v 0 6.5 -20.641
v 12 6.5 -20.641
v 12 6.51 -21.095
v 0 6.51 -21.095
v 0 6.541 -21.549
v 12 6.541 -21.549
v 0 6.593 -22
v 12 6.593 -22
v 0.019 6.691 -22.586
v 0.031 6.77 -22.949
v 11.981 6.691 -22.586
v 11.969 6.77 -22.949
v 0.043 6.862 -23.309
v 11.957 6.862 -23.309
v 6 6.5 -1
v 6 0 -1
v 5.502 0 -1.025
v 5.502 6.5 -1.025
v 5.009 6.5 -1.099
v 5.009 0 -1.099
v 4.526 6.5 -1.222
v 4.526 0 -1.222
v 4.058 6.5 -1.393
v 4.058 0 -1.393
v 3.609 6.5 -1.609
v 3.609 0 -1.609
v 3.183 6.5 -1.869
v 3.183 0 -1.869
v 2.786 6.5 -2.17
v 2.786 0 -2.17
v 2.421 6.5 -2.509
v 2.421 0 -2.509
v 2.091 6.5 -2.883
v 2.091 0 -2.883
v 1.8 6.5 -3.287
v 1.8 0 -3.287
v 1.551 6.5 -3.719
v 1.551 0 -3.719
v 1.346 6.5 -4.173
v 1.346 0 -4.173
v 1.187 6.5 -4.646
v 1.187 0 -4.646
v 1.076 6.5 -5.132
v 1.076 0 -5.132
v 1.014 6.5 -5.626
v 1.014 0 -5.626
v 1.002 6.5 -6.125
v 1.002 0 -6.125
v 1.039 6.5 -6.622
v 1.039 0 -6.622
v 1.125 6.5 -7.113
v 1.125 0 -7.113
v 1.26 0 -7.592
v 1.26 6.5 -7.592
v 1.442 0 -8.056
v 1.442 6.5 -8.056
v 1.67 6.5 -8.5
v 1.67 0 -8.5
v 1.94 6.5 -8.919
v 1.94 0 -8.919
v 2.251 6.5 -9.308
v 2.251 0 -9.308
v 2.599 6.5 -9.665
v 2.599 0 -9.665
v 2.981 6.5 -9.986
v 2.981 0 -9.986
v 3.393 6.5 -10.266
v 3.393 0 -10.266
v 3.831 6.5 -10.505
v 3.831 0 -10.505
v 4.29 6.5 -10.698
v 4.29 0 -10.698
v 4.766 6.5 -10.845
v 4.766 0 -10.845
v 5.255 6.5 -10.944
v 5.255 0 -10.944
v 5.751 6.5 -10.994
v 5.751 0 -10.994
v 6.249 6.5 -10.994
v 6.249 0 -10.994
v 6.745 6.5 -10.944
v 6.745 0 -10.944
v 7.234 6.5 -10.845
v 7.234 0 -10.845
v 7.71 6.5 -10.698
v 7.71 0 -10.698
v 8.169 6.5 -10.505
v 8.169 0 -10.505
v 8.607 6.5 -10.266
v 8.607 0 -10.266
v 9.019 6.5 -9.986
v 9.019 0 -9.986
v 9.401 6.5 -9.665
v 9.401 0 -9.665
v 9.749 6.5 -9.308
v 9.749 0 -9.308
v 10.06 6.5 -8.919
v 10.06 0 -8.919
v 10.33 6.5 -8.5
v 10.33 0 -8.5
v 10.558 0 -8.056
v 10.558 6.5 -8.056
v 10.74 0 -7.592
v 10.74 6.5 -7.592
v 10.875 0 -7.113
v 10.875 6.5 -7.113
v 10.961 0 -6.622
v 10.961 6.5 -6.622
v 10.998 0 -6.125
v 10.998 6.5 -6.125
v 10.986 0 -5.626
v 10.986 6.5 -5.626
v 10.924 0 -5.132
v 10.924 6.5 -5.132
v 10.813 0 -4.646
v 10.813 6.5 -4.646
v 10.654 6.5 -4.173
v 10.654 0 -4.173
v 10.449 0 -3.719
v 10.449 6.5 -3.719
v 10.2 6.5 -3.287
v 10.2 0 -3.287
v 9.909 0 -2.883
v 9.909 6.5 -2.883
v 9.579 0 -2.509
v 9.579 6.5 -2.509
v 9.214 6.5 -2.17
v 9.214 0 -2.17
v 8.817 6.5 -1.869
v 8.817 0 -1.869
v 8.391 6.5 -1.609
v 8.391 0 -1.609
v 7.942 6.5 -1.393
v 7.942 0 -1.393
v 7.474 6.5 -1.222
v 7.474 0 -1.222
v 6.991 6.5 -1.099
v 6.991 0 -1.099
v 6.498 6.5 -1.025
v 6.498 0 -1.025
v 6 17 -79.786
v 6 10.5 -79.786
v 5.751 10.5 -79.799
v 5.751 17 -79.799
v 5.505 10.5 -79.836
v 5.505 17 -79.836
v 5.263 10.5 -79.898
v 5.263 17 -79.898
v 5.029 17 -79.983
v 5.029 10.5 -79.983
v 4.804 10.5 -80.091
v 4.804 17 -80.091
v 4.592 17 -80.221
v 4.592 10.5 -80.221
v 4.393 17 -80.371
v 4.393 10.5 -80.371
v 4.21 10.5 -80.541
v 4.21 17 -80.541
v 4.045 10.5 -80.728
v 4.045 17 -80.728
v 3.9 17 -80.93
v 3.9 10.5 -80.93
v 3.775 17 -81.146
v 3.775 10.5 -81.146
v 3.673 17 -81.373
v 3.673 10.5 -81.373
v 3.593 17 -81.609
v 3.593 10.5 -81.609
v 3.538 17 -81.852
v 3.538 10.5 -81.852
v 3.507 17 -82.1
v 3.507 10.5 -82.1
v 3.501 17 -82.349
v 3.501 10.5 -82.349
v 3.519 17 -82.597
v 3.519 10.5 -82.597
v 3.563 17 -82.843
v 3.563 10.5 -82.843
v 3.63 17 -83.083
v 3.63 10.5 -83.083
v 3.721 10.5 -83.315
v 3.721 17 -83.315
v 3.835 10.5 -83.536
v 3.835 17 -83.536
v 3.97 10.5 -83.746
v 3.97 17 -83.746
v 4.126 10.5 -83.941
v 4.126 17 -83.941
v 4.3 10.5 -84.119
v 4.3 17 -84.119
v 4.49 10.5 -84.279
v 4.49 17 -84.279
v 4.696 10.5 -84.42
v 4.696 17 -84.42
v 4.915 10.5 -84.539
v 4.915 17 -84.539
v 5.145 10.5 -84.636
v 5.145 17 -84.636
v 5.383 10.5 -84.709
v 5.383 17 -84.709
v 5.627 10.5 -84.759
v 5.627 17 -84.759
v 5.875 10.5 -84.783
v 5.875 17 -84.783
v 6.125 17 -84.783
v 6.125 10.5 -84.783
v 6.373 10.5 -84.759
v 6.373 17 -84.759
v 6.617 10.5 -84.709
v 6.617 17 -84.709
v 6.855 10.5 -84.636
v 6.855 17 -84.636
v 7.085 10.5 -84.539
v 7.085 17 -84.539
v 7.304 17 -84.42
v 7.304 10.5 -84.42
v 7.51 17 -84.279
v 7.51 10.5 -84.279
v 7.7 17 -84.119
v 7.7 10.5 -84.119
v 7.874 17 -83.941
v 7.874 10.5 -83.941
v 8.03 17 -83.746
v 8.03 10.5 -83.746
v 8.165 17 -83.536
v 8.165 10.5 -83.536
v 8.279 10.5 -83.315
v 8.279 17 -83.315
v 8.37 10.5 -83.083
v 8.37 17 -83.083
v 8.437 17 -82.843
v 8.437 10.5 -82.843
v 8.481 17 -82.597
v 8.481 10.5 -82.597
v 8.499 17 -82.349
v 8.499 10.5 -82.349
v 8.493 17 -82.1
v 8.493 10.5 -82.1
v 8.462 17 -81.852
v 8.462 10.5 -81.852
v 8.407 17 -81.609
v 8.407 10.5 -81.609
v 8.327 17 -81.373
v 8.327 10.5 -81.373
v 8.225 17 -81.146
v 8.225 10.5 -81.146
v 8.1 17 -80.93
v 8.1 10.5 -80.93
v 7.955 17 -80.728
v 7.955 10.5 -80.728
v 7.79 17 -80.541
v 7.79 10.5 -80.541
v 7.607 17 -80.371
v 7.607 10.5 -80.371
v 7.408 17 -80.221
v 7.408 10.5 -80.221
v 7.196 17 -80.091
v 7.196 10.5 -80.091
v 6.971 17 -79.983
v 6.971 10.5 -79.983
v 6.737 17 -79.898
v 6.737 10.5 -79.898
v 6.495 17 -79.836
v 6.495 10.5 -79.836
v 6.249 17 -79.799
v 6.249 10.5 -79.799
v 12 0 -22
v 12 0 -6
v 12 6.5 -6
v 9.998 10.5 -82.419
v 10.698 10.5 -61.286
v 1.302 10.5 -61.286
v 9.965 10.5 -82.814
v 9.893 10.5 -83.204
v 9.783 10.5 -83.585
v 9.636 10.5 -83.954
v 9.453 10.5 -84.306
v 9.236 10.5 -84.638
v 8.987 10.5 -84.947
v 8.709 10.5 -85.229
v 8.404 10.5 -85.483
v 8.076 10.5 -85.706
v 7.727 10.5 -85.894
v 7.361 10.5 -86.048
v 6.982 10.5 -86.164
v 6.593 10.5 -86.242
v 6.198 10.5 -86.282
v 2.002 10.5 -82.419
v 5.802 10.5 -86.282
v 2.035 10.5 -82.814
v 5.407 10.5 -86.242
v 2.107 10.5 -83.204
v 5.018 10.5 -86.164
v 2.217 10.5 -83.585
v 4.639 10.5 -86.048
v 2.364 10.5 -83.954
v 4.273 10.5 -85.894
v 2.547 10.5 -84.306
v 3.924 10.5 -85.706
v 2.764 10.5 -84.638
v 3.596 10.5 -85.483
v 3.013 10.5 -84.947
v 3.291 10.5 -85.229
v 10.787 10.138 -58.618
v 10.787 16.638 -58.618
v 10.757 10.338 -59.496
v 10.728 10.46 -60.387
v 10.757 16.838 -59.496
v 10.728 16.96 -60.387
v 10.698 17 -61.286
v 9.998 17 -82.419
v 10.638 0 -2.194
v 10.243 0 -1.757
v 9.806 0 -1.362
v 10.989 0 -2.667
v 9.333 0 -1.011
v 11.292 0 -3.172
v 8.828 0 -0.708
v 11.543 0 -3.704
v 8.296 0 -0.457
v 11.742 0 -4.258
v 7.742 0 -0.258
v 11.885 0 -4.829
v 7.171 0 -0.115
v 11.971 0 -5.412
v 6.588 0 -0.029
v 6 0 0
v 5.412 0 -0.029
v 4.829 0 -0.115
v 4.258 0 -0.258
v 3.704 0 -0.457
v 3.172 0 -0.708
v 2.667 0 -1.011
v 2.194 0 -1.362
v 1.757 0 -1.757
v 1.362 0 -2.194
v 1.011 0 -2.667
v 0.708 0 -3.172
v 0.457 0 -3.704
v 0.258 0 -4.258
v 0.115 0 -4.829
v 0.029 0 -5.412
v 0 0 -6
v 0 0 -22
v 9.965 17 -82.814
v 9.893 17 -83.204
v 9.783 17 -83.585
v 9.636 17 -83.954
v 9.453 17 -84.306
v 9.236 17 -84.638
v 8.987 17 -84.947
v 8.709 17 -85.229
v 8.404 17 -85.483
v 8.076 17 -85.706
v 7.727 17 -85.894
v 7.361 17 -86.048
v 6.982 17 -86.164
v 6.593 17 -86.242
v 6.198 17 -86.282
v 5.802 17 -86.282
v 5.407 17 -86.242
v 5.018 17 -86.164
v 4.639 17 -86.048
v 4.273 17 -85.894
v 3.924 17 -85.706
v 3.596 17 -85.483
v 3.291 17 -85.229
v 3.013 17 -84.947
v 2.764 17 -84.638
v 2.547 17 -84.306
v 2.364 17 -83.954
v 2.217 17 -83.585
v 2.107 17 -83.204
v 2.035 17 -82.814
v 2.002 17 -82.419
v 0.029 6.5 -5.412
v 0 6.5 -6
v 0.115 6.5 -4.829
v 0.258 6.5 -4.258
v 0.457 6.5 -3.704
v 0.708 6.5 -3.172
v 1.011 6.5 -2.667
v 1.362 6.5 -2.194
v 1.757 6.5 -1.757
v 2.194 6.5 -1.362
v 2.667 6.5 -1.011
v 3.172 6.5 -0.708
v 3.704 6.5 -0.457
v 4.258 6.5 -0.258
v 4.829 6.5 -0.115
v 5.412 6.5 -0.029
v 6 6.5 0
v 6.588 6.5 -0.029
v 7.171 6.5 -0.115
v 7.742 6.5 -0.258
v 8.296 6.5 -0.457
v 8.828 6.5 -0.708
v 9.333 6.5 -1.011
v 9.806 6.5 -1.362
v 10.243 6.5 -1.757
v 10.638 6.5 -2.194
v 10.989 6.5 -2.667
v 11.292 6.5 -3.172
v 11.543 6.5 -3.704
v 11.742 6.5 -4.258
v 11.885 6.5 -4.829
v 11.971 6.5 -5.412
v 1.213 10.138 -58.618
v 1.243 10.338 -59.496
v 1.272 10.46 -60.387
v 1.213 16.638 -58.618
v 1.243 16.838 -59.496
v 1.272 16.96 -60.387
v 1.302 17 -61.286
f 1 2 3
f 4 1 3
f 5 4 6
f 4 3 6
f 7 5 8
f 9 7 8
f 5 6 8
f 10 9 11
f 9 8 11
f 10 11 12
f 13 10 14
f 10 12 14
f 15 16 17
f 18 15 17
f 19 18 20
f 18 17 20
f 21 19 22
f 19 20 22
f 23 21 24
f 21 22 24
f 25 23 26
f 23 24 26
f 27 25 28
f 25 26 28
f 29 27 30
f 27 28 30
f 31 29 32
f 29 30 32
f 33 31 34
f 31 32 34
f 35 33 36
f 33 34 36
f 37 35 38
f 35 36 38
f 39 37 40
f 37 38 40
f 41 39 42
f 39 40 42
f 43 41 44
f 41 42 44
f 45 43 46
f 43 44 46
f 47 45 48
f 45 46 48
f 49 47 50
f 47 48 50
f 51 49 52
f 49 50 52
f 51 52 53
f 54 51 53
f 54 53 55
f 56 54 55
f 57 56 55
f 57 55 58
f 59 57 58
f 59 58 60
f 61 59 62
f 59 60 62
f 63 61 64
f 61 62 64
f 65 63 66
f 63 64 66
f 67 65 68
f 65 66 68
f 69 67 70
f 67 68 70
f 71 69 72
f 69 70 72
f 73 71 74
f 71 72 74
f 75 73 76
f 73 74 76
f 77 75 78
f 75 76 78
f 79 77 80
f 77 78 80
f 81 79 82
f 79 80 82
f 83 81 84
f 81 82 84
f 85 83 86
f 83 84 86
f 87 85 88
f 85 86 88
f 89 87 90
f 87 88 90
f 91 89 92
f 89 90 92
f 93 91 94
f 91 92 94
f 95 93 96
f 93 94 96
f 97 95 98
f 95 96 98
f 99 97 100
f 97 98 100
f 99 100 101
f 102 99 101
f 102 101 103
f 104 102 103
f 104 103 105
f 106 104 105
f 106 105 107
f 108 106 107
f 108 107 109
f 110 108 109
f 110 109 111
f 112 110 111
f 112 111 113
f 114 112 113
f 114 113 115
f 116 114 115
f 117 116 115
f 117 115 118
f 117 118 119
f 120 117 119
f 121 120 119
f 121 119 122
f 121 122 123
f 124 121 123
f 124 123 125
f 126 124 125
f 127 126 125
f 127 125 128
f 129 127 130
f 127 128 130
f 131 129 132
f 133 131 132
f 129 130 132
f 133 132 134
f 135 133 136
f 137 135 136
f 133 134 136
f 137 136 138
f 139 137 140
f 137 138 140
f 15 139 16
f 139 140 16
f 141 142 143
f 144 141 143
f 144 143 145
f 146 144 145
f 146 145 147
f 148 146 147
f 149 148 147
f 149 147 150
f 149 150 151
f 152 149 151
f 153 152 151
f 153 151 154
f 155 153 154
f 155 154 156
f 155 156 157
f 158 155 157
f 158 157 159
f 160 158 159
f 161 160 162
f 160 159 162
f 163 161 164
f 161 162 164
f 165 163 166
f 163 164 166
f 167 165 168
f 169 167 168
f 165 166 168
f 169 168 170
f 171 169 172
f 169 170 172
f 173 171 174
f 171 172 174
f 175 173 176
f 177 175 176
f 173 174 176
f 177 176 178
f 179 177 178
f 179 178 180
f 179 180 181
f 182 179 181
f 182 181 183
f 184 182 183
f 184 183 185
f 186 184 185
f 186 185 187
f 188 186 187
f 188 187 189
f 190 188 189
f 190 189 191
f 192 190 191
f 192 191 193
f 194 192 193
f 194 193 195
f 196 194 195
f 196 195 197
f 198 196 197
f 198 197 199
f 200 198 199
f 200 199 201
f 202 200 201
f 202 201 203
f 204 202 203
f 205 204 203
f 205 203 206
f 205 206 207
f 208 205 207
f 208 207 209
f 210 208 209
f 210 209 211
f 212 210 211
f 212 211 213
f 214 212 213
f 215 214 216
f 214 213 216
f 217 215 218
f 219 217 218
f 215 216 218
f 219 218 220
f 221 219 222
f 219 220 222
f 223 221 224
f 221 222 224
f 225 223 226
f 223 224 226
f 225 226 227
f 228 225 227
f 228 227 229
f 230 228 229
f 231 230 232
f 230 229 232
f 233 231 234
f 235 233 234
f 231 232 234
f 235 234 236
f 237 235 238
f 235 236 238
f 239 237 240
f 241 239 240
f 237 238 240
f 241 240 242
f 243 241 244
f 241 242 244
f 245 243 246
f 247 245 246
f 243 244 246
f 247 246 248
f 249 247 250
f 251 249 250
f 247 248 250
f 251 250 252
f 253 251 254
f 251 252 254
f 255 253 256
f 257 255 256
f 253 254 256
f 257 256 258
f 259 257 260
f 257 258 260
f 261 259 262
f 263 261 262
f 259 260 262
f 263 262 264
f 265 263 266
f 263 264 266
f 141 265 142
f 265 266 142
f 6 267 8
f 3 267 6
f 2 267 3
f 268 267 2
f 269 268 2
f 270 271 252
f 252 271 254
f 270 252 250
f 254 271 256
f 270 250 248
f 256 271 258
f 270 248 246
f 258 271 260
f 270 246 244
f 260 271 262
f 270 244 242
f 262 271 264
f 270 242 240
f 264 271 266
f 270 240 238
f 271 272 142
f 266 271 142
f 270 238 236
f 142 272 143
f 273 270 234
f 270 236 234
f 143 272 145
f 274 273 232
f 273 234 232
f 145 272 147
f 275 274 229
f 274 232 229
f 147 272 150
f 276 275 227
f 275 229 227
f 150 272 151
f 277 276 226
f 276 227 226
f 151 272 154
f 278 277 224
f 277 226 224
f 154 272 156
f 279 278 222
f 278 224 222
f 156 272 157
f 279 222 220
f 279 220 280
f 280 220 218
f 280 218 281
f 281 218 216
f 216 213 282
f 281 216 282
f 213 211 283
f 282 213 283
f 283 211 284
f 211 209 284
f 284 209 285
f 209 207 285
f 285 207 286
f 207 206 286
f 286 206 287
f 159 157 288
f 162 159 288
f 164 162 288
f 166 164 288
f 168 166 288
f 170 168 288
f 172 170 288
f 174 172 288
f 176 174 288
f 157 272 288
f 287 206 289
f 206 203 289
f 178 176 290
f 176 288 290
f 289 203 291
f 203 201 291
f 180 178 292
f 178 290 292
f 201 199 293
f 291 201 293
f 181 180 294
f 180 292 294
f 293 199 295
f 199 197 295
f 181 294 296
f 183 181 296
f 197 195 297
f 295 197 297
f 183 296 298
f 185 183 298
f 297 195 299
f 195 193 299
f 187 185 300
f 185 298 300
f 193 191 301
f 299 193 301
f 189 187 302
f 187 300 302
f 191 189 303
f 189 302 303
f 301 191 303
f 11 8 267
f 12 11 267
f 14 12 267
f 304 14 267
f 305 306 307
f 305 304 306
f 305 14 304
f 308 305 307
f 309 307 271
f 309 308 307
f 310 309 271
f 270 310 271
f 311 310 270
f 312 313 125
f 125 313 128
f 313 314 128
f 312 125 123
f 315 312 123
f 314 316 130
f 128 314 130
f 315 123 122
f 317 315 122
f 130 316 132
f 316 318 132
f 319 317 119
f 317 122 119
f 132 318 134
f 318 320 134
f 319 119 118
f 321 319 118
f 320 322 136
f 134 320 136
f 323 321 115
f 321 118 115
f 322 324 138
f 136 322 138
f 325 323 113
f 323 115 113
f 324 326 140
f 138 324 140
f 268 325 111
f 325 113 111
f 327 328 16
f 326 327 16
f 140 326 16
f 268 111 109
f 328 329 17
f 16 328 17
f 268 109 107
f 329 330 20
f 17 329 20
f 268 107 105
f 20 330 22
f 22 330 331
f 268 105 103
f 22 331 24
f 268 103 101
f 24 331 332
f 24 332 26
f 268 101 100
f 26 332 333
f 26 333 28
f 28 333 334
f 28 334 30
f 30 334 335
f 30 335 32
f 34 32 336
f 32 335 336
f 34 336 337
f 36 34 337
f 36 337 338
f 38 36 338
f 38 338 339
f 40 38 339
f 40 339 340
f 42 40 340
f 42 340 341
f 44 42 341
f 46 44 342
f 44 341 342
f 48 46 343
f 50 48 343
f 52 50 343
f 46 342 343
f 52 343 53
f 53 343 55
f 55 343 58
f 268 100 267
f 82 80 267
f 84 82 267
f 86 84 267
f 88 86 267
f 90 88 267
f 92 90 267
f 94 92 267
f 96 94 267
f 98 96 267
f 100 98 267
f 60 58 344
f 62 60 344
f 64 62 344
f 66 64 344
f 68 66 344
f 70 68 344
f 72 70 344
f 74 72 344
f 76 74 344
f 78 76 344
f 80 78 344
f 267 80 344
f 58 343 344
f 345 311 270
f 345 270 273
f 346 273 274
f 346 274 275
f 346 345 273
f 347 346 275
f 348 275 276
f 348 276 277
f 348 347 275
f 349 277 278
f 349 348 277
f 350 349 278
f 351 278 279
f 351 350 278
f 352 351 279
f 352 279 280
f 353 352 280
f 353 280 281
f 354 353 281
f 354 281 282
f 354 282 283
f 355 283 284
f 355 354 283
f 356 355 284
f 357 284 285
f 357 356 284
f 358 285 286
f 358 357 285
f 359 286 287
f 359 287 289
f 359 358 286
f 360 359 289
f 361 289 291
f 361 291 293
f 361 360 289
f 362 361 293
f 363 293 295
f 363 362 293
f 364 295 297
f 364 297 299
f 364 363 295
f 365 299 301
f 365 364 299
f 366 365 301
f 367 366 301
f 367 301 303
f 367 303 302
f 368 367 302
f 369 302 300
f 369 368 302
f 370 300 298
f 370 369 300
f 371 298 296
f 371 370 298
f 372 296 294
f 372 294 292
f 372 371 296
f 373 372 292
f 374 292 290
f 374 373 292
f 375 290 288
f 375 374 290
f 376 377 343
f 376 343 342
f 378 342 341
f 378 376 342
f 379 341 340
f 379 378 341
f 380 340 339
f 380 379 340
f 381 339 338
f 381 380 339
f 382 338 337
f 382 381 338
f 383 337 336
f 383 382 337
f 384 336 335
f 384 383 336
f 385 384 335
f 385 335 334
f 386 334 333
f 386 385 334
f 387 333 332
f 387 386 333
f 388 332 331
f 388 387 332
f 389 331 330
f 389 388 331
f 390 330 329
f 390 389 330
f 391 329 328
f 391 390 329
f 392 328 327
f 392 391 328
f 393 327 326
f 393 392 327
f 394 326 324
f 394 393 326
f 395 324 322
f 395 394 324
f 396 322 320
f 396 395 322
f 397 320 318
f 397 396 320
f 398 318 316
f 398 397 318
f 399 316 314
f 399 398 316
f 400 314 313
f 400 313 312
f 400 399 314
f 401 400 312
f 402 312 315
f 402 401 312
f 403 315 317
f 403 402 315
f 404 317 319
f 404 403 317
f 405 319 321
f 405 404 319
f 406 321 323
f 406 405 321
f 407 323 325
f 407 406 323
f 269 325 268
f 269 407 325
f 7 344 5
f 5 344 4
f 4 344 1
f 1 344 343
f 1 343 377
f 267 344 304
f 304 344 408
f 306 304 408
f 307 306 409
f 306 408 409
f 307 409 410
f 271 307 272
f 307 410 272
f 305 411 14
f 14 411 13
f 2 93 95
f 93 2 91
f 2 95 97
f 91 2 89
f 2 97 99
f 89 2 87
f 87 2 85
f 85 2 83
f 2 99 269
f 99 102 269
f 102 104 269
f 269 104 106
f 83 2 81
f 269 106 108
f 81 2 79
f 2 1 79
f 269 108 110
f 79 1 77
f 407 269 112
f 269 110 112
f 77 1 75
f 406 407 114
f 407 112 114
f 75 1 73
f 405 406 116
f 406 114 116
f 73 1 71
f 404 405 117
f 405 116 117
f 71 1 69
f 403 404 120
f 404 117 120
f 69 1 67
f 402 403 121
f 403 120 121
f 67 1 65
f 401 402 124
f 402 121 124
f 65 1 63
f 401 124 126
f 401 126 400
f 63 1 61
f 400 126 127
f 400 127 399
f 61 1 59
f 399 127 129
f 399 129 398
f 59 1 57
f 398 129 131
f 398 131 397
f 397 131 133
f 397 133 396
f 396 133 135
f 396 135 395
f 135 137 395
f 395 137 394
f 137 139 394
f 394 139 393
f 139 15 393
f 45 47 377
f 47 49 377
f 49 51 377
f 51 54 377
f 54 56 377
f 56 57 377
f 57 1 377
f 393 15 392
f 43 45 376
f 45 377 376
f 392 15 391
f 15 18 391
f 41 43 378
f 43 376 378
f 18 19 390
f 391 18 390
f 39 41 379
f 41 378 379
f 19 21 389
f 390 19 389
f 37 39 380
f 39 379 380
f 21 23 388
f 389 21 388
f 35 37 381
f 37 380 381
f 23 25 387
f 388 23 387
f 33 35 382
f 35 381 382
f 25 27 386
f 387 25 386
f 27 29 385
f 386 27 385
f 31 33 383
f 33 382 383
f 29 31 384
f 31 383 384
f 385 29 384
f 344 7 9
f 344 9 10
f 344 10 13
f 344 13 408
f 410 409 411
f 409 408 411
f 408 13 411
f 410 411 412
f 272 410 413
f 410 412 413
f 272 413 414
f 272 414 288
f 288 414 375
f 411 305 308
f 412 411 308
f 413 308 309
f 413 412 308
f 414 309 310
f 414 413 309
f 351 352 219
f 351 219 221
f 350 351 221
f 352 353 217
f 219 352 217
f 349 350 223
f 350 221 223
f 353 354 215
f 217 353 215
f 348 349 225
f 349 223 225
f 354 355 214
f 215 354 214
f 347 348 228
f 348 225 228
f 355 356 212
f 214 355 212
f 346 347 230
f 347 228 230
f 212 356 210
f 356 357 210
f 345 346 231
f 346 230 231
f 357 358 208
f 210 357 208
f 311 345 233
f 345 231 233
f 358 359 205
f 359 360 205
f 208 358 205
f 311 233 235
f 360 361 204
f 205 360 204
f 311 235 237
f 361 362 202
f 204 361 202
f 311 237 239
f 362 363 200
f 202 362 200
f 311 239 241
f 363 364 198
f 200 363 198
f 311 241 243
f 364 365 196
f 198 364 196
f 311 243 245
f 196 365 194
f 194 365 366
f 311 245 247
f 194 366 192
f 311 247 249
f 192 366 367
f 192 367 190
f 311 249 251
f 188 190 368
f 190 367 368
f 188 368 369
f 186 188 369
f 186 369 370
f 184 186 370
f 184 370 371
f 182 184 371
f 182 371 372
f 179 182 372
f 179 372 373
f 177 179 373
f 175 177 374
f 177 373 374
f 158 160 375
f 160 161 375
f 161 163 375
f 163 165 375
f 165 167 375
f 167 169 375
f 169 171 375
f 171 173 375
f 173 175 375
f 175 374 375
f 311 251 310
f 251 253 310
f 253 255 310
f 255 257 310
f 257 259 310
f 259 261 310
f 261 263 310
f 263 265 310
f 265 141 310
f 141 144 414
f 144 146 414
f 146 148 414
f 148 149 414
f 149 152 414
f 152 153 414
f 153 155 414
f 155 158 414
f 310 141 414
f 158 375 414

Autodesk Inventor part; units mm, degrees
ref_plane "YZ Plane" through (0, 0, 0) normal (1, 0, 0) x (0, 1, 0)
ref_plane "XZ Plane" through (0, 0, 0) normal (0, 1, 0) x (-1, 0, 0)
ref_plane "XY Plane" through (0, 0, 0) normal (0, 0, 1) x (1, 0, 0)
sketch "Sketch19" plane through (0, 0, 0) normal (1, 0, 0) x (0, 1, 0)
  line L0 (0, 0) -> (0, -22)
  line L1 (0, -22) -> (10.1375, -58.6184)
  line L2 (10.5, -61.2865) -> (10.5, -86.2865)
  line L3 (10.5, -86.2865) -> (17, -86.2865)
  line L4 (17, -86.2865) -> (17, -61.2865)
  line L5 (16.6375, -58.6184) -> (6.5, -22)
  line L6 (6.5, -22) -> (6.5, 0)
  line L7 (6.5, 0) -> (0, 0)
  arc A0 (10.5, -61.2865) -> (10.1375, -58.6184) centre (0.5, -61.2865) ccw
  arc A1 (17, -61.2865) -> (16.6375, -58.6184) centre (7, -61.2865) ccw
  point P0 (16.909, -59.9402)
  dimension "d79" = 10
  dimension "d80" = 10
  dimension "d82" = 6.5
  dimension "d83" = 10.5
  dimension "d84" = 25
  dimension "d85" = 22
  dimension "d86" = 37.9402
extrude "Extrusion7" add sketch "Sketch19" along normal blind 12
sketch "Sketch20" plane through (0, 6.5, 0) normal (0, 1, 0) x (1, 0, 0)
  circle A0 centre (6, 6) radius 6
  line L0 (0, 0) -> (12, 0) projected
  line L1 (0, 0) -> (12, 0) projected
  line L2 (0, 0) -> (0, 6)
  line L3 (0, 0) -> (0, 22) projected
  line L4 (12, 0) -> (12, 6)
  point P0 (6, 0)
  point P1 (6, 0)
  dimension "d89" = 12
extrude "Extrusion8" cut sketch "Sketch20" against normal blind 12 contours L4 L0 A0 | A0 L0 L2
sketch "Sketch21" plane through (0, 17, -61.2865) normal (0, 1, 0) x (1, 0, 0)
  circle A0 centre (6, 21) radius 4
  line L0 (0, 25) -> (12, 25) projected
  arc A1 (0, -55.2865) -> (12, -55.2865) centre (6, -55.2865) ccw projected
  line L1 (12, -39.2865) -> (12, -55.2865) projected
  line L2 (0, -39.2865) -> (12, -39.2865) projected
  line L3 (0, -39.2865) -> (0, -55.2865) projected
  line L4 (0, -39.2865) -> (2.0022, 21.1325)
  line L5 (12, -39.2865) -> (12, -2.6681) projected
  line L6 (12, -39.2865) -> (9.9978, 21.1325)
  line L7 (0, 25) -> (0, 0) projected
  line L8 (0, -39.2865) -> (0, 25)
  line L9 (0, 25) -> (6, 25)
  line L10 (6, 25) -> (12, 25)
  line L11 (12, 0) -> (12, 25) projected
  line L12 (12, 25) -> (12, -39.2865)
  point P0 (0, -61.2865)
  point P1 (12, 0)
  dimension "d93" = 8
extrude "Extrusion9" cut sketch "Sketch21" against normal up to surface (17 mm away) contours A0 L0 L11 L12 L5 L6 | L4 L8 L7 L0 A0
sketch "Sketch22" plane through (6, 6.5, -6) normal (0, 1, 0) x (1, 0, 0)
  arc A0 (-6, 0) -> (6, 0) centre (0, 0) ccw projected
  point P0 (-6, -6)
hole "Hole1" at (6, 6.5, -6) direction (0, -1, 0) diameter 10 end through all
sketch "Sketch23" plane through (6, 17, -82.2865) normal (0, 1, 0) x (1, 0, 0)
  arc A0 (3.9978, 0.1325) -> (-3.9978, 0.1325) centre (0, 0) ccw projected
  point P0 (-6, -82.2865)
hole "Hole2" at (6, 17, -82.2865) direction (0, -1, 0) diameter 5 end through all
fillet "Fillet1" radius 10 1 edges at (6, 6.5, -22)
properties part number "47A"
